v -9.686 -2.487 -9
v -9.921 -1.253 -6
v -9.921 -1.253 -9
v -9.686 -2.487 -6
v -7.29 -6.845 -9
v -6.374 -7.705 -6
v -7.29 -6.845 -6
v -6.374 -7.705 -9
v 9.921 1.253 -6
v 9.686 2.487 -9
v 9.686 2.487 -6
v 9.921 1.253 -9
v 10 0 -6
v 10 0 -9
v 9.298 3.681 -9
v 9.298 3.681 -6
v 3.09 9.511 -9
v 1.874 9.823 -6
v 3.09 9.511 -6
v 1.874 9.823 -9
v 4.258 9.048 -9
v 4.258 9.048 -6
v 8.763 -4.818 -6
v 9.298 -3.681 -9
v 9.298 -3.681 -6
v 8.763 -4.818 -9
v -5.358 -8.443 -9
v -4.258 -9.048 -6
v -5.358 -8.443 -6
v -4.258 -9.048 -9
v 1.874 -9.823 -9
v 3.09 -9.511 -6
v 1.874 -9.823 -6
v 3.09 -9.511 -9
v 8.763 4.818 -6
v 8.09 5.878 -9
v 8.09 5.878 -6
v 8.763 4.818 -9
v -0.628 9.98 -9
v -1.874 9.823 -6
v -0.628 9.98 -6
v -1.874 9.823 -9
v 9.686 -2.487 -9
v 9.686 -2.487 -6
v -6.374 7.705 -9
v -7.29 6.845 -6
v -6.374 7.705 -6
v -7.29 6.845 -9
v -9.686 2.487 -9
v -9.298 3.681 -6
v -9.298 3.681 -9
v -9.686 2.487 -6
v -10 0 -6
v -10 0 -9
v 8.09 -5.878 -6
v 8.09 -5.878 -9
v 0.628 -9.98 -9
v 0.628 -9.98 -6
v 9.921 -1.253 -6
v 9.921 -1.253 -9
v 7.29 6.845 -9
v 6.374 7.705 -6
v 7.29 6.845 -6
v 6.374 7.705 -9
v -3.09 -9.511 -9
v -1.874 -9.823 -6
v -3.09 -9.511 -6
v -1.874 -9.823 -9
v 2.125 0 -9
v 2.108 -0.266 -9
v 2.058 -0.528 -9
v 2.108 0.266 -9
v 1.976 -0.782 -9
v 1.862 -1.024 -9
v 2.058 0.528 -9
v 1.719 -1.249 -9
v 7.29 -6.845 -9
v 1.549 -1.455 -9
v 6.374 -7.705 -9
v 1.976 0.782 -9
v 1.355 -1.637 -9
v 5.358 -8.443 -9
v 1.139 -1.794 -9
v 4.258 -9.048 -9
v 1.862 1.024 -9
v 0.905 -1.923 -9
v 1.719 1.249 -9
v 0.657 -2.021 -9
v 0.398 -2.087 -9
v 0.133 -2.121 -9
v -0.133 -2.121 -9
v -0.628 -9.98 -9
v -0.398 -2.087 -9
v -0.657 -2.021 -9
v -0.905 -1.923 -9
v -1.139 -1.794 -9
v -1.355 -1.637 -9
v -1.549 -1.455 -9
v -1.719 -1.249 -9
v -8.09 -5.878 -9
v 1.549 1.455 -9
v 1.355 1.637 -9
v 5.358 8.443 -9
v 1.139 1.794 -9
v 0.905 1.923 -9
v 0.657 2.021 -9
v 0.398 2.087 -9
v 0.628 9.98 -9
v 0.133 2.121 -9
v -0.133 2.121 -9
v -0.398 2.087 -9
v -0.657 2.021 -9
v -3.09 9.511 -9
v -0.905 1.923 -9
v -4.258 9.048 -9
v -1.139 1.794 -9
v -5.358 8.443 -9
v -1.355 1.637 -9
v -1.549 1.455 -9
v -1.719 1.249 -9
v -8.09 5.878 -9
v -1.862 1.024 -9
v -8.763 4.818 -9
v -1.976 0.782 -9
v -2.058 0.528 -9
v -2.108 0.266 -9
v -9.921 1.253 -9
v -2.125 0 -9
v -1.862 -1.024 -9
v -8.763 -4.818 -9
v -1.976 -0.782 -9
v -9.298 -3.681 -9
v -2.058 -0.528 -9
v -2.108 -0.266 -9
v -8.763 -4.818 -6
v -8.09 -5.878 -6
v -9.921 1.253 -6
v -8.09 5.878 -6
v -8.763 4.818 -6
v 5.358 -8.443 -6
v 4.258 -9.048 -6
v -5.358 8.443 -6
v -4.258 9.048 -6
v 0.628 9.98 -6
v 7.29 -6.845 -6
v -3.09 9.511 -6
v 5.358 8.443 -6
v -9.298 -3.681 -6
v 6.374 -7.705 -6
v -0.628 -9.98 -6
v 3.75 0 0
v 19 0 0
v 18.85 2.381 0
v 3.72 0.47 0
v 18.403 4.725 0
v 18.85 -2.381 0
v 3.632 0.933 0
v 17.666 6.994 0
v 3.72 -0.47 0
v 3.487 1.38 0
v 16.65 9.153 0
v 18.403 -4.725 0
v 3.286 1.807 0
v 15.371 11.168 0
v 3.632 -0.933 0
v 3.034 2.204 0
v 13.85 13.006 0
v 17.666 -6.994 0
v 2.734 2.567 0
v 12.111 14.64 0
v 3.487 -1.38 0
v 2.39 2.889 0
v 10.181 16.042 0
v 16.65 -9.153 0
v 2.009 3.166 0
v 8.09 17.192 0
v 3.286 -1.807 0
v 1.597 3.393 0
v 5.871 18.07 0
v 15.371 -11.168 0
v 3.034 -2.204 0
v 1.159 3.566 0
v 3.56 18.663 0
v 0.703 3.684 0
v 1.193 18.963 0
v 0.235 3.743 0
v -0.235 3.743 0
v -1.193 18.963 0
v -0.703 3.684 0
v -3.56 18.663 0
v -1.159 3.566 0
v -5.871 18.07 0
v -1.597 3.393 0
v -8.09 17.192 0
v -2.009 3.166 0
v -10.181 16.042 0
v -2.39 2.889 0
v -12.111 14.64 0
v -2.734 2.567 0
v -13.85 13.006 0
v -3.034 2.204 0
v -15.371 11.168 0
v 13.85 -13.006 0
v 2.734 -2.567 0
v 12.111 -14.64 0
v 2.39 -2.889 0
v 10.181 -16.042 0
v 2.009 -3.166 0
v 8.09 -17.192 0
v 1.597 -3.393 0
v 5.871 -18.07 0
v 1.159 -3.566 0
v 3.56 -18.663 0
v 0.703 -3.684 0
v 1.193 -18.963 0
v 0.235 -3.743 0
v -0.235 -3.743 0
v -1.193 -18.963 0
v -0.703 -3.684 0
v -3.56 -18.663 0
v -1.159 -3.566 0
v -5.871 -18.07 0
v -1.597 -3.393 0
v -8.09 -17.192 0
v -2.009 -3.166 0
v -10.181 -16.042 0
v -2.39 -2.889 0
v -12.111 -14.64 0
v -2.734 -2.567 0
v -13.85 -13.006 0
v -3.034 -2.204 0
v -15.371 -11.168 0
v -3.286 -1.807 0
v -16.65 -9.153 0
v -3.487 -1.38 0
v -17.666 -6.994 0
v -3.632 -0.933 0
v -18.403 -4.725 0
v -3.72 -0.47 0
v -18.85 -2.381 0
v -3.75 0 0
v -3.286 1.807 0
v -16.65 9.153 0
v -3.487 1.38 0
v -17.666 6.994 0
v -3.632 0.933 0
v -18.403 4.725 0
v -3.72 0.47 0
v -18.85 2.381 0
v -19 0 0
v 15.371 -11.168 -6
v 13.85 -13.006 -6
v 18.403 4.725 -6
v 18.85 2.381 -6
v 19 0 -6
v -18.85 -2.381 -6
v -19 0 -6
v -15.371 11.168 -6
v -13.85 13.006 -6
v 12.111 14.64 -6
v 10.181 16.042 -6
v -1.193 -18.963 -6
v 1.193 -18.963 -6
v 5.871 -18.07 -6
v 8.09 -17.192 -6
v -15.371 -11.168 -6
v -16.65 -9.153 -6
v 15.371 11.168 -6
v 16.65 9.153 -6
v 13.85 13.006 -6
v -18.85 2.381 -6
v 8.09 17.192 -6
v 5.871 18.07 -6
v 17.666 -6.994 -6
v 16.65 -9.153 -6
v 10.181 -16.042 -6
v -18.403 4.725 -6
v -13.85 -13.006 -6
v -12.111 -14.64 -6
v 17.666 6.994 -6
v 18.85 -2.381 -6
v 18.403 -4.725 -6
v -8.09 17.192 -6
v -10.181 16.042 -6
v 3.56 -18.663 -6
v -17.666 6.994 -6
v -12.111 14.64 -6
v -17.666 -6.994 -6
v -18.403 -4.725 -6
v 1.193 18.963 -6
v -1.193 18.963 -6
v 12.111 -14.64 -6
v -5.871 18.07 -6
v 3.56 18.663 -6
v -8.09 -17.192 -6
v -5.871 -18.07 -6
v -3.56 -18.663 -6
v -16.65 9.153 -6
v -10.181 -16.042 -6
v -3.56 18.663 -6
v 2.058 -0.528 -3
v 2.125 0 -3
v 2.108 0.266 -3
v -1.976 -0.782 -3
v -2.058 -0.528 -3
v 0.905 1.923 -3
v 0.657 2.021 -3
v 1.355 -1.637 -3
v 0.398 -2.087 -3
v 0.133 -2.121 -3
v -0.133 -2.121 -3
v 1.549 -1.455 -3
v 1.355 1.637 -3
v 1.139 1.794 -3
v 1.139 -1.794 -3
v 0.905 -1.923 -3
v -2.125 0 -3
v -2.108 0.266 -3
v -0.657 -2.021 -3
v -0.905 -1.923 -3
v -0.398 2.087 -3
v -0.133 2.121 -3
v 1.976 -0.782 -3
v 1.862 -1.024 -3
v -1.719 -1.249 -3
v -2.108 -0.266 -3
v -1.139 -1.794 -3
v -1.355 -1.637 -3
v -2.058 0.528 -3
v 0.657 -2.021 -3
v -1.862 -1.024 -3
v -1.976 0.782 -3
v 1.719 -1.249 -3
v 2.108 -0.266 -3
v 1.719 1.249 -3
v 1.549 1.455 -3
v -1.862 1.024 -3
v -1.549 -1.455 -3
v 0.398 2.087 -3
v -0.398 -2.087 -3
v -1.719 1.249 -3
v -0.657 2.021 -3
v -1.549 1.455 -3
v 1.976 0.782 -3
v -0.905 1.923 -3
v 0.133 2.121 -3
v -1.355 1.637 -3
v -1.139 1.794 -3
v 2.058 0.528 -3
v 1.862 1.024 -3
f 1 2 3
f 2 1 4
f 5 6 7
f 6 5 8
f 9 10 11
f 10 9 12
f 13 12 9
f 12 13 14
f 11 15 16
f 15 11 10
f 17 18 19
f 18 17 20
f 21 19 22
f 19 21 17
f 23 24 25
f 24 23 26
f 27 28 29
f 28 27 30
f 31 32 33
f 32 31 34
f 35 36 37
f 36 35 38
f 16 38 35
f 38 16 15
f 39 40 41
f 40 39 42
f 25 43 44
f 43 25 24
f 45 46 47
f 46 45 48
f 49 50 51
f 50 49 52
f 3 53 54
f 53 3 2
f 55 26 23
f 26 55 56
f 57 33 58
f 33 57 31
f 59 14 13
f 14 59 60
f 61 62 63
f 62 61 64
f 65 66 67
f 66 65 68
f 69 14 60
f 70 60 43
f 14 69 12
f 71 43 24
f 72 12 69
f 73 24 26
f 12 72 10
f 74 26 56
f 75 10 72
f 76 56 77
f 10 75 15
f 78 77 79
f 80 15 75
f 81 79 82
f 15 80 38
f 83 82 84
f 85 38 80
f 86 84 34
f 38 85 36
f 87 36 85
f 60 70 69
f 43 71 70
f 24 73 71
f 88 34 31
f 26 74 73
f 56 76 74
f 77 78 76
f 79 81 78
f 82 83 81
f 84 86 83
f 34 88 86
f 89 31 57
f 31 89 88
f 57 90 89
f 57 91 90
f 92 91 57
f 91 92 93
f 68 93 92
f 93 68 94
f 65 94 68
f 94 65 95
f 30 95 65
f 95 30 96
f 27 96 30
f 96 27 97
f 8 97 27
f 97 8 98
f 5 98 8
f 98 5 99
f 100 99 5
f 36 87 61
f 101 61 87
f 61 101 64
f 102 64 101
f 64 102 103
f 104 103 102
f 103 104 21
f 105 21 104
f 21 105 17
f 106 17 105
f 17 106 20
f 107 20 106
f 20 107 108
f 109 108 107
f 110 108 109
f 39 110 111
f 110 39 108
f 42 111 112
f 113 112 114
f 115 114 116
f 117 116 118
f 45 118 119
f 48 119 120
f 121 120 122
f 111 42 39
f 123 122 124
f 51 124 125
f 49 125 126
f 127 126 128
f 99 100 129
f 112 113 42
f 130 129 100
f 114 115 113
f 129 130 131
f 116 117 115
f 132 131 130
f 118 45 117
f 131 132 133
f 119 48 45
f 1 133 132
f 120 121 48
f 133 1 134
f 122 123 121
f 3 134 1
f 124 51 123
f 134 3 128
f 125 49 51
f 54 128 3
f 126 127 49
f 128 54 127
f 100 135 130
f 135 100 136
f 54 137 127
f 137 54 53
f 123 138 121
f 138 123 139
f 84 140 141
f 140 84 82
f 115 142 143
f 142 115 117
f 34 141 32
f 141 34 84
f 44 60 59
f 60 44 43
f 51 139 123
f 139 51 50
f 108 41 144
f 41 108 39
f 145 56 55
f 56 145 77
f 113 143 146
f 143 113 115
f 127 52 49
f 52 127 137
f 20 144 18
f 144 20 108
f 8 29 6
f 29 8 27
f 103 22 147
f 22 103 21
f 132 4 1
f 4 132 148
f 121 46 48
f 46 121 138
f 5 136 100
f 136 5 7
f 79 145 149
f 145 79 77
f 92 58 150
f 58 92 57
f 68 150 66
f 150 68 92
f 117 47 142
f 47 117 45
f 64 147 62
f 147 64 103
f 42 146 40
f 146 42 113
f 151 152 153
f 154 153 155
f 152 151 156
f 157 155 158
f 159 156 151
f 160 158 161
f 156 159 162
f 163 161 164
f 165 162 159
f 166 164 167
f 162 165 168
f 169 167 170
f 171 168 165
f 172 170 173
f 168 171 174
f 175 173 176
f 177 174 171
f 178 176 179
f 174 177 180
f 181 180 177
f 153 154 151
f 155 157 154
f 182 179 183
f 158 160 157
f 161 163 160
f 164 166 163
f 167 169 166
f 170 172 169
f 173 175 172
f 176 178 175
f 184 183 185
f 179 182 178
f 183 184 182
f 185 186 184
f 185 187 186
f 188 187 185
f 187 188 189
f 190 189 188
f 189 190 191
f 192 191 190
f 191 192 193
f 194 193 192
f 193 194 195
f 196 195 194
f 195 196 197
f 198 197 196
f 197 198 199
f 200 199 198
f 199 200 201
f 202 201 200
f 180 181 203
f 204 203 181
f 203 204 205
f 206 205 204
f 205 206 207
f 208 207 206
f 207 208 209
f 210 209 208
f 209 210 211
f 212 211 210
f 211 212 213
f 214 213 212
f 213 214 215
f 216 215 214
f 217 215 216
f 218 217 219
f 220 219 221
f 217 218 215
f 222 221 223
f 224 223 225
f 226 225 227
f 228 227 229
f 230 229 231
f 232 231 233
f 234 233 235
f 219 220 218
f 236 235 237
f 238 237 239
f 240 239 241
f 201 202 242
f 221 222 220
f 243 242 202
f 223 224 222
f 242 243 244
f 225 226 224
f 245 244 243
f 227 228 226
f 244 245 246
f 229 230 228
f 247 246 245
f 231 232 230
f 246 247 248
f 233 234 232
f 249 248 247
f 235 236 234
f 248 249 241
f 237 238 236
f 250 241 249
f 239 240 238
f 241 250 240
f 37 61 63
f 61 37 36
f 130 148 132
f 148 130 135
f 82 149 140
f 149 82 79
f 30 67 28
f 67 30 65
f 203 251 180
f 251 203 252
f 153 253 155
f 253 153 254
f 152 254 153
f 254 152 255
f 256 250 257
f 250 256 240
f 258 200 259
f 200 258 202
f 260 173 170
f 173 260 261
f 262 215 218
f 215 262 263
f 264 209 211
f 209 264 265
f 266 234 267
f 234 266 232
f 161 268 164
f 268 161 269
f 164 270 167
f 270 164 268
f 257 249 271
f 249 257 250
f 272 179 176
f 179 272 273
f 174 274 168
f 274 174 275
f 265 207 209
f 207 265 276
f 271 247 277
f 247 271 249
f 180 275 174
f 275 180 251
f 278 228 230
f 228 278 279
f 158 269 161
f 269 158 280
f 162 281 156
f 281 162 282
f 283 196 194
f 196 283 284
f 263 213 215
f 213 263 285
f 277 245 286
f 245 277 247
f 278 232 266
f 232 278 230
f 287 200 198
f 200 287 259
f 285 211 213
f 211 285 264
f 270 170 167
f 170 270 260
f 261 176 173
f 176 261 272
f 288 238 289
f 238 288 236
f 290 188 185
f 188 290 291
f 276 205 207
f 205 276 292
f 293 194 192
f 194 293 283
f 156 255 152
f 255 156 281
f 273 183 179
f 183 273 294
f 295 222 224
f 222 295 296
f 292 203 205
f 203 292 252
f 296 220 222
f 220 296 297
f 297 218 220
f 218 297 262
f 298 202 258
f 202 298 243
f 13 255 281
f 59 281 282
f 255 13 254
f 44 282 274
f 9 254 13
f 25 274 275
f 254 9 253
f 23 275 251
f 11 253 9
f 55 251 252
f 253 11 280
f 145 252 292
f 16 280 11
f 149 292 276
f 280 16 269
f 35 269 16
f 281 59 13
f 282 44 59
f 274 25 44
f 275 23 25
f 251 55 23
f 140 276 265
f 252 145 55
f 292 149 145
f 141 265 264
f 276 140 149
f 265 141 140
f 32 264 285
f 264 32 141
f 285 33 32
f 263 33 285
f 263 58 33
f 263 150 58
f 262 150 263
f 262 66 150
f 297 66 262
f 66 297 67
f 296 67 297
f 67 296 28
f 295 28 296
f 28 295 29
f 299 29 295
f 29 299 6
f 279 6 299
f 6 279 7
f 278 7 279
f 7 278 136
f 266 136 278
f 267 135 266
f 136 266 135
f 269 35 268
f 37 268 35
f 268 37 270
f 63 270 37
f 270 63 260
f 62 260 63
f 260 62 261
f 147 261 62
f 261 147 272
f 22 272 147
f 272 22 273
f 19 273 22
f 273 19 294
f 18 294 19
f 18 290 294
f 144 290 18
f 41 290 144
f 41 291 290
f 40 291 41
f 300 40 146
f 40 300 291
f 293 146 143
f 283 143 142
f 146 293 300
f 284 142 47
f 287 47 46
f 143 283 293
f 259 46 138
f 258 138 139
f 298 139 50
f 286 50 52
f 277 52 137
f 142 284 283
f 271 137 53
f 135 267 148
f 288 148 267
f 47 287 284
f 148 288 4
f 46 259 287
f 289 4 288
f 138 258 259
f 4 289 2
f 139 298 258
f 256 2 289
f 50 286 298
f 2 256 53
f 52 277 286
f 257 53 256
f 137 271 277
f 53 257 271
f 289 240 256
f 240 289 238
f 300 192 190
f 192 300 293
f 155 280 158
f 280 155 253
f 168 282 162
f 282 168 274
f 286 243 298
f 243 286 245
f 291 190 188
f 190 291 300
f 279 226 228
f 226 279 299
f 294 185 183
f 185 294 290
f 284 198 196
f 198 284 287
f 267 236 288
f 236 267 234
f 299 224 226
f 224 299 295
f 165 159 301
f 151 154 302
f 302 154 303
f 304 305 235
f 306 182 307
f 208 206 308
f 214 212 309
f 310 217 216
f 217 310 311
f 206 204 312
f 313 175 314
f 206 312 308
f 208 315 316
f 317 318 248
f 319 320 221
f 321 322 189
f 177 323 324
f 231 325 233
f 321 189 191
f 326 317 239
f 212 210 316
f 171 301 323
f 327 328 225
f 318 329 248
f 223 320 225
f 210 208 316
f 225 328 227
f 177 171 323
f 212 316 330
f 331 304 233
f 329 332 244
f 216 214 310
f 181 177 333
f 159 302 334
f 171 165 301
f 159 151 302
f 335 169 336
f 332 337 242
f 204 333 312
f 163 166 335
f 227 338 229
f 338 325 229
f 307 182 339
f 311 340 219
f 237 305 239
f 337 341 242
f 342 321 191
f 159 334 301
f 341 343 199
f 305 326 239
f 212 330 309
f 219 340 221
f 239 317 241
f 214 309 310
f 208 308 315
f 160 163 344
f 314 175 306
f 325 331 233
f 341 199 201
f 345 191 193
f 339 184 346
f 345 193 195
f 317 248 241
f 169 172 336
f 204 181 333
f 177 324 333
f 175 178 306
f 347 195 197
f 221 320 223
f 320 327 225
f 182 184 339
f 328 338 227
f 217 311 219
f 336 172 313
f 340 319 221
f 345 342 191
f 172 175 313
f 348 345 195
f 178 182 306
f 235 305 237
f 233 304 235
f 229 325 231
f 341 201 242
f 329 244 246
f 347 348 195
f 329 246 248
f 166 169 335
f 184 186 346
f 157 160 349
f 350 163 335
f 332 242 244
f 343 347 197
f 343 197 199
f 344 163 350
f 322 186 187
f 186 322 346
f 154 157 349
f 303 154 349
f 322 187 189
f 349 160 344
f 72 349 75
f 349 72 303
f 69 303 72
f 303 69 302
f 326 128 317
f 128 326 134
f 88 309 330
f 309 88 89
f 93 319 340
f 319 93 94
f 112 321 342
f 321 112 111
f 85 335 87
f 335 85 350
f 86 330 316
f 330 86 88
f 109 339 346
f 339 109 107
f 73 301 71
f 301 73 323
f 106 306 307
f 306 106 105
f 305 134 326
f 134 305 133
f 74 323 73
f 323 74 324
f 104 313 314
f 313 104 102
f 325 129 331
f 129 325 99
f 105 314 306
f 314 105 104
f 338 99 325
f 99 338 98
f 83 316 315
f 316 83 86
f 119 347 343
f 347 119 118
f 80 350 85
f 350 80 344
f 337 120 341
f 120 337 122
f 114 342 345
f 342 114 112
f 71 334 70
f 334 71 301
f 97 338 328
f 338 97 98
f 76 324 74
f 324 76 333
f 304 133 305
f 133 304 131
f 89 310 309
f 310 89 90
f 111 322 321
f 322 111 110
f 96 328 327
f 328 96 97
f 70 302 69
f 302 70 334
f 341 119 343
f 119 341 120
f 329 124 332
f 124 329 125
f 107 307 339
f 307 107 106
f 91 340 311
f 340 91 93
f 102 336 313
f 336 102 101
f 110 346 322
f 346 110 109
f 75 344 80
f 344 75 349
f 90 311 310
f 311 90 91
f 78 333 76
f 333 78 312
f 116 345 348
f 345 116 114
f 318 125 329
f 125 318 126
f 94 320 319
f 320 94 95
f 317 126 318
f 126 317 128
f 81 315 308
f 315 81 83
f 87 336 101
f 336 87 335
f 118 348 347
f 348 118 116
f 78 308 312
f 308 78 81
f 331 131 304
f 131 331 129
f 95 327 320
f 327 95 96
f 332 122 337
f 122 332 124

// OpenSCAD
$fn = 50;


difference() {
	union() {
		translate(v = [0, 0, -9.0000000000]) {
			cylinder(h = 9, r = 10.0000000000);
		}
		translate(v = [0, 0, -6.0000000000]) {
			cylinder(h = 6, r = 19.0000000000);
		}
	}
	union() {
		translate(v = [0, 0, 0]) {
			rotate(a = [0, 0, 0]) {
				difference() {
					union() {
						#translate(v = [0, 0, -9.0000000000]) {
							cylinder(h = 9, r = 2.0000000000);
						}
						#translate(v = [0, 0, -3]) {
							cylinder(h = 3, r = 10.0000000000, r1 = 2.1250000000, r2 = 3.7500000000);
						}
						#translate(v = [0, 0, -9.0000000000]) {
							cylinder(h = 9, r = 2.1250000000);
						}
						#translate(v = [0, 0, -9.0000000000]) {
							cylinder(h = 9, r = 2.0000000000);
						}
					}
					union();
				}
			}
		}
	}
}
